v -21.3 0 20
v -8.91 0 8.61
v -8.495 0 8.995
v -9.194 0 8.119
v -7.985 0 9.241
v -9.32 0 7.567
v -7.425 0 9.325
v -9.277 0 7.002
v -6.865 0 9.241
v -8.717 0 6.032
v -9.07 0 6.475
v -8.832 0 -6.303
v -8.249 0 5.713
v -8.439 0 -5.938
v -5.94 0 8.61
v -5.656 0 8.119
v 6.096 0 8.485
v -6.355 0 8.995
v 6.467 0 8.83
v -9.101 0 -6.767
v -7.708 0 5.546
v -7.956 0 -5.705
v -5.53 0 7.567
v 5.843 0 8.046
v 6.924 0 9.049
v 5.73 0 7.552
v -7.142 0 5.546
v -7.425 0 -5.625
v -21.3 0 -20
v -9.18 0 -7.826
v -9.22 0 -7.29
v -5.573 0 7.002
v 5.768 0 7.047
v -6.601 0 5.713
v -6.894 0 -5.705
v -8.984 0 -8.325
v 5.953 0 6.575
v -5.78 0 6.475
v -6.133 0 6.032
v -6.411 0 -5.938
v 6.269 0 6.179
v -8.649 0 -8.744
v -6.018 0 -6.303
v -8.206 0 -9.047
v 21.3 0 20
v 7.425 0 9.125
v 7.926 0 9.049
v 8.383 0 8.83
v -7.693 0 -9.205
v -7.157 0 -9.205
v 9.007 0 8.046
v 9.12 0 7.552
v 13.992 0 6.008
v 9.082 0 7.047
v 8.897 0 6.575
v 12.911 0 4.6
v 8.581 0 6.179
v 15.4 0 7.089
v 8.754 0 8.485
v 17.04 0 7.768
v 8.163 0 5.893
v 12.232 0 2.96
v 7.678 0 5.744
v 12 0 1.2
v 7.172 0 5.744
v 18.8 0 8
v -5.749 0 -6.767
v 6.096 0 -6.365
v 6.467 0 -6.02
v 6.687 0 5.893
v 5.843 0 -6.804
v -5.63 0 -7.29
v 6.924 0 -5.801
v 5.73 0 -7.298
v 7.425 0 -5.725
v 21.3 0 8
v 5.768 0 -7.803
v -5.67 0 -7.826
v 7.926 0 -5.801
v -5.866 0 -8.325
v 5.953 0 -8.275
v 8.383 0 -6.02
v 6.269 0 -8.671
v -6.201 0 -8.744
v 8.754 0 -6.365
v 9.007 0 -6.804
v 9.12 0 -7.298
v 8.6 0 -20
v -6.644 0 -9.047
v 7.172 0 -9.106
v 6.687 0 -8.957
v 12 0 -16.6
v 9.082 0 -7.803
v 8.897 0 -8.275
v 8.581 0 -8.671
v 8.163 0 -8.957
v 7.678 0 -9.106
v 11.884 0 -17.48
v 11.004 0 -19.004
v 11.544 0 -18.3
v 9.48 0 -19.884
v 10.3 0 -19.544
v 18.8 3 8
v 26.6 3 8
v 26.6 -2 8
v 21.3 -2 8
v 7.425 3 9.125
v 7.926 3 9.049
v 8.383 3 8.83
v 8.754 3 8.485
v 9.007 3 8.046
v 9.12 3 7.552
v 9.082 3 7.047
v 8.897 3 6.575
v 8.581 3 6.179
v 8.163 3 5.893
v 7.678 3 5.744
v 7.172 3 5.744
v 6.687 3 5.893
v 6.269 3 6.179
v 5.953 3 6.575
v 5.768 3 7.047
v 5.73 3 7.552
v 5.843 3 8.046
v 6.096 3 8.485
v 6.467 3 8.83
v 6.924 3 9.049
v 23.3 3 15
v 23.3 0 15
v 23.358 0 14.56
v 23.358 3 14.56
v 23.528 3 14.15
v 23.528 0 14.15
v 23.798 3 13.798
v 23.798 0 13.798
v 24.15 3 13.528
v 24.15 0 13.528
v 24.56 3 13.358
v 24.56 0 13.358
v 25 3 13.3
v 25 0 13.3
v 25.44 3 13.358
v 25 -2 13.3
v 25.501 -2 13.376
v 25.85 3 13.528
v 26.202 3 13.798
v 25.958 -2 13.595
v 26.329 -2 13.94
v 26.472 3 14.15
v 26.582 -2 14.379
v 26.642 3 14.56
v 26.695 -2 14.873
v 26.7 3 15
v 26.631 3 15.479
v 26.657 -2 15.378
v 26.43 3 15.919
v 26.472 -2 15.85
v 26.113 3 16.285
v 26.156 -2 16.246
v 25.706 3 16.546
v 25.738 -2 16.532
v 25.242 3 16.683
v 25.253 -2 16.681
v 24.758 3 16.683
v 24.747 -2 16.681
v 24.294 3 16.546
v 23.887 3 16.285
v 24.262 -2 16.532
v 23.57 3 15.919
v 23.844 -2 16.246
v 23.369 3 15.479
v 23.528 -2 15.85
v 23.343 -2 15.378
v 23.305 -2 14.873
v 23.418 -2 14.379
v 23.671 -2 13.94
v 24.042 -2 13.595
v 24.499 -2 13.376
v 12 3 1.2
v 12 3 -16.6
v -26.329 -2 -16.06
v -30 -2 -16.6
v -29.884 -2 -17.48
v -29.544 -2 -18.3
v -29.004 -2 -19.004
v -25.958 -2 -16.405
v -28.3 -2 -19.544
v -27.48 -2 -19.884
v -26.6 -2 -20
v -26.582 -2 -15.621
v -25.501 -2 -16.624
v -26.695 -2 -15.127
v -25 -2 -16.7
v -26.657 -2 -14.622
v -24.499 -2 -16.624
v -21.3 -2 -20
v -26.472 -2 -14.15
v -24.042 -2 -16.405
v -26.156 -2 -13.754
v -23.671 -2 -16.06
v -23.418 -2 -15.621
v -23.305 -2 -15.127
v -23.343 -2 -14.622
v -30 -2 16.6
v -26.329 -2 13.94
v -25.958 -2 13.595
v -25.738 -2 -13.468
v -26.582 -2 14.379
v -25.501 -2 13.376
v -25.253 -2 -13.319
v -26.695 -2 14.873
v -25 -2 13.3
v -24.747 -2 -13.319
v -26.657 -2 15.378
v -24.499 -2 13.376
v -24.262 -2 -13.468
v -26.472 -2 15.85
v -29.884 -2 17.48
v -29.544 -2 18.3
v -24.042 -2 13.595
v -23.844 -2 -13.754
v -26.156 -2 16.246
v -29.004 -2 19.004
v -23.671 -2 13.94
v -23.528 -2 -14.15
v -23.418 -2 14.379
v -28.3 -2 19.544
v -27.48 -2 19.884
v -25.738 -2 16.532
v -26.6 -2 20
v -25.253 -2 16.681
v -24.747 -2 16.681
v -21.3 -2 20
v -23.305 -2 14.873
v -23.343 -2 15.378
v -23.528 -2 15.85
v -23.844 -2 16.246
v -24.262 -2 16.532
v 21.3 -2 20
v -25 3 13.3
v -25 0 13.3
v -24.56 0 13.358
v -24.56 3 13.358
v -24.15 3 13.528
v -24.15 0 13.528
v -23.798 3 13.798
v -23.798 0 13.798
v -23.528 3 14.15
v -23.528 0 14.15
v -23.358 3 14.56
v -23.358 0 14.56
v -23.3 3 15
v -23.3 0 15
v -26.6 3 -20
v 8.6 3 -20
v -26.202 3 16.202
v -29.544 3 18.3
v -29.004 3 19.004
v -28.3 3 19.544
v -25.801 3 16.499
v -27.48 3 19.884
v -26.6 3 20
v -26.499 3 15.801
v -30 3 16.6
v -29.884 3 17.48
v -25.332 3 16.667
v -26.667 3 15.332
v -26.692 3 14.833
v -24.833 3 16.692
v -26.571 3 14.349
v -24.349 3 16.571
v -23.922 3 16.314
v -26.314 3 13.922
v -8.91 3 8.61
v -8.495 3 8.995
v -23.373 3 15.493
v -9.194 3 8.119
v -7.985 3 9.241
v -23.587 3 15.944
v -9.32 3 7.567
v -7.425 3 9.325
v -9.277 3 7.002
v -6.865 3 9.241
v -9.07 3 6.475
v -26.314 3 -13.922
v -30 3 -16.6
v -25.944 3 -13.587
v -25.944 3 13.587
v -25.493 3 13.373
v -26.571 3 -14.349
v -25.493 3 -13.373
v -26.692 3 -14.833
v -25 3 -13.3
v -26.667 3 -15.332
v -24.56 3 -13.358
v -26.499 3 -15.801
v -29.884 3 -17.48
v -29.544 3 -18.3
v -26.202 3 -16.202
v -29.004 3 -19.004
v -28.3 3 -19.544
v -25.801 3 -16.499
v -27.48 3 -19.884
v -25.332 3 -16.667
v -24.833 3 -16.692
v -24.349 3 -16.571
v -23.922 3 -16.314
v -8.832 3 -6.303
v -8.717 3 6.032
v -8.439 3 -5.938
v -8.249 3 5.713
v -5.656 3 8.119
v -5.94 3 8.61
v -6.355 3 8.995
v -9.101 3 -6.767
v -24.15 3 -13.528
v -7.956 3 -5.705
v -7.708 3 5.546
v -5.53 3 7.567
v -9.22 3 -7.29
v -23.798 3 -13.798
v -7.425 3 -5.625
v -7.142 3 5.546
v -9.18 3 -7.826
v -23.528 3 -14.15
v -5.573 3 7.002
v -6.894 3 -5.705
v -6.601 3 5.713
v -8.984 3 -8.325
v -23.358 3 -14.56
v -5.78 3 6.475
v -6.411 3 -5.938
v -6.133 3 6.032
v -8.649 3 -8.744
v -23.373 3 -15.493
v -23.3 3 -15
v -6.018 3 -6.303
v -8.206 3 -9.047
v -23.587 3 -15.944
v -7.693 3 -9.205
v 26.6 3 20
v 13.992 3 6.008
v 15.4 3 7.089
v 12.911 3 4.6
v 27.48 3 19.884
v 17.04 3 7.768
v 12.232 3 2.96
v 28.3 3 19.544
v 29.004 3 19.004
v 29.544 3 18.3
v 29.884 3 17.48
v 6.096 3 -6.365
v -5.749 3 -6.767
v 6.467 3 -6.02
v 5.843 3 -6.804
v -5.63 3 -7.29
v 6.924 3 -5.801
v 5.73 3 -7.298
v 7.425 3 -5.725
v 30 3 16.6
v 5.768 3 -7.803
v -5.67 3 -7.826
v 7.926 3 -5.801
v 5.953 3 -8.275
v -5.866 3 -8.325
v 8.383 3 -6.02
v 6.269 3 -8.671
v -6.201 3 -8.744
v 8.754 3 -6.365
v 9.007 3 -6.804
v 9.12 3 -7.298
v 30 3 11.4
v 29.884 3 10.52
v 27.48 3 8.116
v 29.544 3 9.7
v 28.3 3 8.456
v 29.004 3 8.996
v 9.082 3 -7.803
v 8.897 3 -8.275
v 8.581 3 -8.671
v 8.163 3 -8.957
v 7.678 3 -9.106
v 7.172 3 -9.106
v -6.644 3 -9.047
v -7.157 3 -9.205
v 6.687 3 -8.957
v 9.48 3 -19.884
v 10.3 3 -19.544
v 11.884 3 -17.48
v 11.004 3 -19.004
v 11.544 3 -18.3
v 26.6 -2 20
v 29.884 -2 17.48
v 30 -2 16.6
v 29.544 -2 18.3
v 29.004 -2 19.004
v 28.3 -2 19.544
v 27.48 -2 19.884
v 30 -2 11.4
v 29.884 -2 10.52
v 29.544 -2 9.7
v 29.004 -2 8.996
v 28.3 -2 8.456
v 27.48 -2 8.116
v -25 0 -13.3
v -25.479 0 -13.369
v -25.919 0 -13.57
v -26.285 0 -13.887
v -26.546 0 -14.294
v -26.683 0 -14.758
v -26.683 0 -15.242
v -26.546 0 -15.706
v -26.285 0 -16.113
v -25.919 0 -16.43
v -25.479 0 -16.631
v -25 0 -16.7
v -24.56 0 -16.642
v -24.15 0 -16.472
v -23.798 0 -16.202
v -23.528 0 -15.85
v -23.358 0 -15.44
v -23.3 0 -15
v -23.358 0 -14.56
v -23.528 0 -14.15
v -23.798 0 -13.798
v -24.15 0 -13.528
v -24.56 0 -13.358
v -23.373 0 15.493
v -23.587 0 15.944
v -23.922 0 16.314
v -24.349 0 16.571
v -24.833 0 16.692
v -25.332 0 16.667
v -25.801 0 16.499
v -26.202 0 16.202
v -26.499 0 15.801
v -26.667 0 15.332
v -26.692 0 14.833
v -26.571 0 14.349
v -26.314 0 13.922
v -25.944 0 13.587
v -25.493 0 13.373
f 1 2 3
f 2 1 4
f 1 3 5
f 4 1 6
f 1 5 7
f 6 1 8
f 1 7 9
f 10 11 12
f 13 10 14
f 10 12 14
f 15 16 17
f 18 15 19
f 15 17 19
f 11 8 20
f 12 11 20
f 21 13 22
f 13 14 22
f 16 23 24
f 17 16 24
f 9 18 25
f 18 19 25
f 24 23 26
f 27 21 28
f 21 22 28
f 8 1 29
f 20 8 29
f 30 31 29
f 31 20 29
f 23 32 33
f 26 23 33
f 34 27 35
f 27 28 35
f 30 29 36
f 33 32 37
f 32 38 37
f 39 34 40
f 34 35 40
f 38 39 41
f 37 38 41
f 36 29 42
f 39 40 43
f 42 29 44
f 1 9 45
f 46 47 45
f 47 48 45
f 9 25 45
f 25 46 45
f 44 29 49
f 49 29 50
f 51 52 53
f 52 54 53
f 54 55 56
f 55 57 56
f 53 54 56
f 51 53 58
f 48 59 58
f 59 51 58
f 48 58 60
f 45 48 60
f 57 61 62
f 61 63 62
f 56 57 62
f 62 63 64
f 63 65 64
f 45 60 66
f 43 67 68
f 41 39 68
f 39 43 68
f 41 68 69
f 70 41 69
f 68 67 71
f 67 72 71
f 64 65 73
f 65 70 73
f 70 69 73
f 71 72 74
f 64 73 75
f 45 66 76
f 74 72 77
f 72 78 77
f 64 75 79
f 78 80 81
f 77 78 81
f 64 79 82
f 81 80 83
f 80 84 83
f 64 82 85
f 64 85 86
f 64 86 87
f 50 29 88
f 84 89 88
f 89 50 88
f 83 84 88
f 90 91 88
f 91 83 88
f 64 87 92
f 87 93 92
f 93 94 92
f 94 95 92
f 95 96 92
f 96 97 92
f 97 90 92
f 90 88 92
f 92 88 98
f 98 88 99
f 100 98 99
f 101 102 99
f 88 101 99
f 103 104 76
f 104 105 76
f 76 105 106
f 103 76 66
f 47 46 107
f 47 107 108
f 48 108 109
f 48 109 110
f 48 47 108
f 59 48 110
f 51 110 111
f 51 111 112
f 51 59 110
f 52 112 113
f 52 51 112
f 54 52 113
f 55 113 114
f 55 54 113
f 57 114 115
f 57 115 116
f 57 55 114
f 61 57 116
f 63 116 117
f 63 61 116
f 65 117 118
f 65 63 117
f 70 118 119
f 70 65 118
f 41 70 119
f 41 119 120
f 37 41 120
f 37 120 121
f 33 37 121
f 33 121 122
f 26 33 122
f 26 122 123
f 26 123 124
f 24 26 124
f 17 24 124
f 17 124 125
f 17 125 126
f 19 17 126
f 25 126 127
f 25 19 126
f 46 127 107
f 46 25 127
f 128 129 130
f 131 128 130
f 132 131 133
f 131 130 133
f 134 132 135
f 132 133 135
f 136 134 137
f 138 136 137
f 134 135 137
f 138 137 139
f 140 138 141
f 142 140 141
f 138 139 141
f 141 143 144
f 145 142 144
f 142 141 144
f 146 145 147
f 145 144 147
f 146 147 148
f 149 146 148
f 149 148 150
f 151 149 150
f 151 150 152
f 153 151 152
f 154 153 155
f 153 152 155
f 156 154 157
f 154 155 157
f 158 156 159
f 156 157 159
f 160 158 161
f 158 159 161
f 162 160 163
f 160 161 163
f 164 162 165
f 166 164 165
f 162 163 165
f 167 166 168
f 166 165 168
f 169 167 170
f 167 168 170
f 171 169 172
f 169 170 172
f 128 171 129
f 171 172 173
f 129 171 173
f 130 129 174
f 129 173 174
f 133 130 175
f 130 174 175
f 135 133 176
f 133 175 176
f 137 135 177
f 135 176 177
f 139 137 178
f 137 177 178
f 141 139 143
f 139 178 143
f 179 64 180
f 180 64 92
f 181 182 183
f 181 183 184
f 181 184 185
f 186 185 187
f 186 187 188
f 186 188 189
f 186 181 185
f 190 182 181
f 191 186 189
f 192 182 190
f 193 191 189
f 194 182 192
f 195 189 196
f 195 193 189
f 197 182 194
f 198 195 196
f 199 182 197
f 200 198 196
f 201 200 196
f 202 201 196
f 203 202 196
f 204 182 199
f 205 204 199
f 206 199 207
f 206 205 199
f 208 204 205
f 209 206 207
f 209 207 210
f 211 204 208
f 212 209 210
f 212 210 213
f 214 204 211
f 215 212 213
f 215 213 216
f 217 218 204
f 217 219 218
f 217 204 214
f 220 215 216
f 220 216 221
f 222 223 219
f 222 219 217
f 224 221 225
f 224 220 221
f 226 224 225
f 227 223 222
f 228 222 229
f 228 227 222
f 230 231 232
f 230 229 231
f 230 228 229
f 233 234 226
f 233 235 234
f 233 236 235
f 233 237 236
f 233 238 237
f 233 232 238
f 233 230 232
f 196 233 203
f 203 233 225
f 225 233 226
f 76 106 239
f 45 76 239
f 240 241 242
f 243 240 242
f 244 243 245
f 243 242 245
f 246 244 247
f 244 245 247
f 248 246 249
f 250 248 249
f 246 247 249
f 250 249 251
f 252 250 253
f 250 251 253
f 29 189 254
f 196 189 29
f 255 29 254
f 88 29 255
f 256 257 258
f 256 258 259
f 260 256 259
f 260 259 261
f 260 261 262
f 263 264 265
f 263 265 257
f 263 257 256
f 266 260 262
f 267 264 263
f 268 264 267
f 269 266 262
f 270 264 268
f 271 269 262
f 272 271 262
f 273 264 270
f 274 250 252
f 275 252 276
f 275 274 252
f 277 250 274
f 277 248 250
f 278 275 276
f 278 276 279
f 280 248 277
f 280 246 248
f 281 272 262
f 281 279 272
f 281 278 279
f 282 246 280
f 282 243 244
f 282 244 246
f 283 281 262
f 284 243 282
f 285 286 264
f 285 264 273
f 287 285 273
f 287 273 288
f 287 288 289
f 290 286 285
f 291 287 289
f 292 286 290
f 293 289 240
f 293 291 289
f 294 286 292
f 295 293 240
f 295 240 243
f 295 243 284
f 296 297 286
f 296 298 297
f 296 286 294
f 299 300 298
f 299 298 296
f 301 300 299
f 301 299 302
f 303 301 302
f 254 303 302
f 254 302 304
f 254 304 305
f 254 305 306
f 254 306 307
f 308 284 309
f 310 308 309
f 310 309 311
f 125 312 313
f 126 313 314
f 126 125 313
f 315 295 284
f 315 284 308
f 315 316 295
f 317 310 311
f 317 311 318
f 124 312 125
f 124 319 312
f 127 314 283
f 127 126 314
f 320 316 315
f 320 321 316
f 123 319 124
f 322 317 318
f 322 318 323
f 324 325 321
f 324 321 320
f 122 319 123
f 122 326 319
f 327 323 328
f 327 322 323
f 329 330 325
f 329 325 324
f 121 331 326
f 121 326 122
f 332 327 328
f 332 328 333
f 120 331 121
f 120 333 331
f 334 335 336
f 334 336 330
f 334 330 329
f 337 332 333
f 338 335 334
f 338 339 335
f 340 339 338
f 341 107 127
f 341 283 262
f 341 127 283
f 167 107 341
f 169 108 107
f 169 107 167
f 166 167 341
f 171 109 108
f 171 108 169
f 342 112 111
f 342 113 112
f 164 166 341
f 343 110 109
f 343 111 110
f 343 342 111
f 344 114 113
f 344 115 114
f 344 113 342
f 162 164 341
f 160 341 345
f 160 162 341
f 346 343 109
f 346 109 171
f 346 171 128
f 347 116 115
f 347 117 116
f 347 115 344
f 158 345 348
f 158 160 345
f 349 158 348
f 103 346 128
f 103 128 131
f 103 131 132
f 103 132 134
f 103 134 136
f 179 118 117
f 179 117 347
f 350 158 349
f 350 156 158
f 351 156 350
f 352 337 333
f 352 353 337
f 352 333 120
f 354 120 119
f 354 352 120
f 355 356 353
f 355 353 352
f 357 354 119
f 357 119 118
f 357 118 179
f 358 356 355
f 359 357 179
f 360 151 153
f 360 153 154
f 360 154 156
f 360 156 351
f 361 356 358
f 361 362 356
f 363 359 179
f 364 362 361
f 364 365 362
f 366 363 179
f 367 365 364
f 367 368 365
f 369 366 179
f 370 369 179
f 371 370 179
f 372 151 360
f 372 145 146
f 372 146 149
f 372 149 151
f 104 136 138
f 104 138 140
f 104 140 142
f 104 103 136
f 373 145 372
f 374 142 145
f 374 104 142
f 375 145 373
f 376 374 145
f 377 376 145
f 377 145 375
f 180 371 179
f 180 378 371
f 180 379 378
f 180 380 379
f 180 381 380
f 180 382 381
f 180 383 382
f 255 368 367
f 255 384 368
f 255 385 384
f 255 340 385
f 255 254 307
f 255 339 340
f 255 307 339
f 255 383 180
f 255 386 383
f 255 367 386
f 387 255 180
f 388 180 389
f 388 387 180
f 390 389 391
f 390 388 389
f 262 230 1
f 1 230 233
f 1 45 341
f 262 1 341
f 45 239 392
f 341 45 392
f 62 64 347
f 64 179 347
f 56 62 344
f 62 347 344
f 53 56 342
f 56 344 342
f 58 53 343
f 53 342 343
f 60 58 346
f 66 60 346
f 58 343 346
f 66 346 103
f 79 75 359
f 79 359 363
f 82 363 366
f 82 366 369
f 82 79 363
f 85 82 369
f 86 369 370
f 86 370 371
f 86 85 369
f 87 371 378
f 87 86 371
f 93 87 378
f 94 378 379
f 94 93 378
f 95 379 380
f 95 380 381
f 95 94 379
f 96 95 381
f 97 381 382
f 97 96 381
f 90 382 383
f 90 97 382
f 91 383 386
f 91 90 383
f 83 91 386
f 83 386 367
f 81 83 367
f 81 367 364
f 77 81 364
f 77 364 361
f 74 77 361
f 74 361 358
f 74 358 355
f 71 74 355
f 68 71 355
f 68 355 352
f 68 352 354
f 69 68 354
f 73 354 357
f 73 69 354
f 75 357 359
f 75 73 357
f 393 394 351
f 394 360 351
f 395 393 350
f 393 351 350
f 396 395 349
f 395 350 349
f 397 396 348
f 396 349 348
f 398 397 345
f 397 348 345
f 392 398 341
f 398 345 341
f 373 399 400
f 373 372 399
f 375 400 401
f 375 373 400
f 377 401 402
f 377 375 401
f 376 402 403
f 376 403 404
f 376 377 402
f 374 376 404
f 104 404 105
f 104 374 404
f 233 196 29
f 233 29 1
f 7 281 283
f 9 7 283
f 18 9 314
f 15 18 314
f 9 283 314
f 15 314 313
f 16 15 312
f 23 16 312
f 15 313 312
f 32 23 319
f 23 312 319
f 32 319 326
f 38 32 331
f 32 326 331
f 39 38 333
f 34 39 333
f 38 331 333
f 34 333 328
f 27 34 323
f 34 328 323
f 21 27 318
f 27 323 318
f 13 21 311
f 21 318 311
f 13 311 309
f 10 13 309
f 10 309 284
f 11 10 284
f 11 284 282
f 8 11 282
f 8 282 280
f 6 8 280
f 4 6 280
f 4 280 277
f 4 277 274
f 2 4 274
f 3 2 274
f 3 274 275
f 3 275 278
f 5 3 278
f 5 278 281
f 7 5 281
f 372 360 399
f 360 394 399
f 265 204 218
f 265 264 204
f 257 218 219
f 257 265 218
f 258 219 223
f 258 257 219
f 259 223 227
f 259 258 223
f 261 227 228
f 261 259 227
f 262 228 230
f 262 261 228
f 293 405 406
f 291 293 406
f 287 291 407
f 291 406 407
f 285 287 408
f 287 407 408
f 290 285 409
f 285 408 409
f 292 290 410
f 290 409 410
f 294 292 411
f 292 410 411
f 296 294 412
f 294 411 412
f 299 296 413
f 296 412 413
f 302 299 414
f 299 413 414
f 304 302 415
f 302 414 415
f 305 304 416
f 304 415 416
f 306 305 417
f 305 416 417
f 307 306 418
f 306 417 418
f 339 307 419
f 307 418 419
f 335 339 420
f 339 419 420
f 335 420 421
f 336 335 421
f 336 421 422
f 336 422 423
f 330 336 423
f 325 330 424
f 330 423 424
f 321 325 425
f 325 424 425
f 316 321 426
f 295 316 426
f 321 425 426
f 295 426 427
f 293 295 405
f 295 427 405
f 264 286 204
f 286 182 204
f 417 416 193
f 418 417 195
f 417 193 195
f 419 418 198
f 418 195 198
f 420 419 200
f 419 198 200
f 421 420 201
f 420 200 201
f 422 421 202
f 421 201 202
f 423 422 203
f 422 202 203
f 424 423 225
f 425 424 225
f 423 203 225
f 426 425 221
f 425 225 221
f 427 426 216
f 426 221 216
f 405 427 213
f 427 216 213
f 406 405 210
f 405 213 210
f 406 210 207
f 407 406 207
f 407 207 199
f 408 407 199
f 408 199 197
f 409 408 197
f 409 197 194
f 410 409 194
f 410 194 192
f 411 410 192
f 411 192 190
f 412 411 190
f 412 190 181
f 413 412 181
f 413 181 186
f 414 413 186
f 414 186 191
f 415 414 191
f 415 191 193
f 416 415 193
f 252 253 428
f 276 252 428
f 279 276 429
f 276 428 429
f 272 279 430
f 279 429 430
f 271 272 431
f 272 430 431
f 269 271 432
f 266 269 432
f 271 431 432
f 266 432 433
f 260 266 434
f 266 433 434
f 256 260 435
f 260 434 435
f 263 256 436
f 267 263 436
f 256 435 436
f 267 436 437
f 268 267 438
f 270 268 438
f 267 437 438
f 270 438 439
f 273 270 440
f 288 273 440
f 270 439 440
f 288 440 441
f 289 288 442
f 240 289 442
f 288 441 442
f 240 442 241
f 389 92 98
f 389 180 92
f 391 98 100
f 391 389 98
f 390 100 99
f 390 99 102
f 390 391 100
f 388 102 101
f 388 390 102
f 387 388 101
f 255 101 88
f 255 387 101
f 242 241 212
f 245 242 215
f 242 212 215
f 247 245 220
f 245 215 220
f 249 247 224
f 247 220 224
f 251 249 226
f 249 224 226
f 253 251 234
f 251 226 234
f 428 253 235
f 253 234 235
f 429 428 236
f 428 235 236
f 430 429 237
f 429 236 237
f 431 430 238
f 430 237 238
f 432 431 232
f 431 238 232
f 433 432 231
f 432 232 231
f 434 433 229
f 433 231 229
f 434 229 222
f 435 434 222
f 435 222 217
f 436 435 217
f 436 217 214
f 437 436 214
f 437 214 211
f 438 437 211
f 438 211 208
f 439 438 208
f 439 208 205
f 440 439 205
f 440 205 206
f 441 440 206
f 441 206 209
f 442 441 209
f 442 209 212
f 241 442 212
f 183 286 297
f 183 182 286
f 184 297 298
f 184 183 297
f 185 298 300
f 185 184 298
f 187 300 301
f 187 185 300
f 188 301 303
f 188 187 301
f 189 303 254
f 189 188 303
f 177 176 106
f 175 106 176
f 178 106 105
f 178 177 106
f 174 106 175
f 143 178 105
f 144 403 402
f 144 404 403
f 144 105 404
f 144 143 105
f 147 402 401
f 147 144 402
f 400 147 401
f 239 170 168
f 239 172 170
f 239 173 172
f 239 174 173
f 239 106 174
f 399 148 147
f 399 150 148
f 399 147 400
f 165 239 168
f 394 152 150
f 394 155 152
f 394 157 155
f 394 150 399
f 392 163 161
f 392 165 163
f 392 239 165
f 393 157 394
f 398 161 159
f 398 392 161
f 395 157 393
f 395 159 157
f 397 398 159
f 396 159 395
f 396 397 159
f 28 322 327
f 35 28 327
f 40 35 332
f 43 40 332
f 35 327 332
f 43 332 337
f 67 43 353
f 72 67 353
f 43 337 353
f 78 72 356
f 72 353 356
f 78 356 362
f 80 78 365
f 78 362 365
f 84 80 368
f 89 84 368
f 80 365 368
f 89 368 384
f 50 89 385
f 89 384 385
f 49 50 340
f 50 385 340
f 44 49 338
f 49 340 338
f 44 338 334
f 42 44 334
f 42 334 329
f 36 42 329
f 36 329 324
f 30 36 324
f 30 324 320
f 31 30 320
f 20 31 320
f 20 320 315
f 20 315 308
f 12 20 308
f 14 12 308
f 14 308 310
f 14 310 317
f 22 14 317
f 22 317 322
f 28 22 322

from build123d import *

# Parameters (mm, degrees)
SKETCH_2_W          = 24
SKETCH_2_H          = 5
SKETCH_2_R          = 1.7
EXTRUDE_1_DEPTH     = 3
FILLET_2_R          = 6.8
EXTRUDE_START       = 2
SKETCH_4_W          = 8.7
SKETCH_4_H          = 40
SKETCH_4_R          = 1.7
SKETCH_4_H_2        = 12
EXTRUDE_2_DEPTH     = 2
FILLET_3_R          = 3.4
SKETCH_5_R          = 1.9
SKETCH_5_R_2        = 1.8
CUT_EXTRUDE_1_DEPTH = 10


with BuildPart() as part:
    # 草图2 → 凸台-拉伸1 (new body)
    # profile 1 of 7: a face of its own
    with BuildSketch(Plane(origin=(0, 0, 0), x_dir=(1, 0, 0), z_dir=(0, 1, 0))):
        with BuildLine():
            Line((25, -8), (12, -8))
            Line((12, -8), (12, -15))
            Line((12, -15), (23.3, -15))
            ThreePointArc((23.3, -15), (23.797918472, -13.797918472), (25, -13.3))
            Line((25, -13.3), (25, -8))
        make_face()
    # profile 2 of 7: a face of its own
    with BuildSketch(Plane(origin=(0, 0, 0), x_dir=(1, 0, 0), z_dir=(0, 1, 0))):
        with BuildLine():
            Line((23.3, -15), (12, -15))
            Line((12, -15), (12, -20))
            Line((12, -20), (30, -20))
            Line((30, -20), (30, -8))
            Line((30, -8), (25, -8))
            Line((25, -8), (25, -13.3))
            ThreePointArc((25, -13.3), (26.202081528, -13.797918472), (26.7, -15))
            ThreePointArc((26.7, -15), (25, -16.7), (23.3, -15))
        make_face()
    # profile 3 of 7: a face of its own
    with BuildSketch(Plane(origin=(0, 0, 0), x_dir=(1, 0, 0), z_dir=(0, 1, 0))):
        with Locations((0, -17.5)):
            Rectangle(SKETCH_2_W, SKETCH_2_H)
    # profile 4 of 7: a face of its own
    with BuildSketch(Plane(origin=(0, 0, 0), x_dir=(1, 0, 0), z_dir=(0, 1, 0))):
        Polygon((12, 15), (-12, 15), (-12, -15), (12, -15), (12, -8), align=None)
        with Locations(Location((-7.425, -7.425, 0), (0, 0, 270))):
            Circle(SKETCH_2_R, mode=Mode.SUBTRACT)
        with Locations(Location((7.425, -7.425, 0), (0, 0, 270))):
            Circle(SKETCH_2_R, mode=Mode.SUBTRACT)
        with Locations(Location((-7.425, 7.425, 0), (0, 0, 270))):
            Circle(SKETCH_2_R, mode=Mode.SUBTRACT)
        with Locations(Location((7.425, 7.425, 0), (0, 0, 270))):
            Circle(SKETCH_2_R, mode=Mode.SUBTRACT)
    # profile 5 of 7: a face of its own
    with BuildSketch(Plane(origin=(0, 0, 0), x_dir=(1, 0, 0), z_dir=(0, 1, 0))):
        with Locations((0, 17.5)):
            Rectangle(SKETCH_2_W, SKETCH_2_H)
    # profile 6 of 7: a face of its own
    with BuildSketch(Plane(origin=(0, 0, 0), x_dir=(1, 0, 0), z_dir=(0, 1, 0))):
        with BuildLine():
            Line((-12, 15), (-23.3, 15))
            ThreePointArc((-23.3, 15), (-23.797918472, 13.797918472), (-25, 13.3))
            Line((-25, 13.3), (-25, -13.3))
            ThreePointArc((-25, -13.3), (-23.797918472, -13.797918472), (-23.3, -15))
            Line((-23.3, -15), (-12, -15))
            Line((-12, -15), (-12, 15))
        make_face()
    # profile 7 of 7: a face of its own
    with BuildSketch(Plane(origin=(0, 0, 0), x_dir=(1, 0, 0), z_dir=(0, 1, 0))):
        with BuildLine():
            ThreePointArc((-25, 13.3), (-26.202081528, 16.202081528), (-23.3, 15))
            Line((-23.3, 15), (-12, 15))
            Line((-12, 15), (-12, 20))
            Line((-12, 20), (-30, 20))
            Line((-30, 20), (-30, -20))
            Line((-30, -20), (-12, -20))
            Line((-12, -20), (-12, -15))
            Line((-12, -15), (-23.3, -15))
            ThreePointArc((-23.3, -15), (-26.202081528, -16.202081528), (-25, -13.3))
            Line((-25, -13.3), (-25, 13.3))
        make_face()
    extrude(amount=EXTRUDE_1_DEPTH)

    # 圆角2
    fillet_2_edges = [part.edges().sort_by_distance(p)[0] for p in [
        (12, 1.5, 8),
    ]]
    fillet(fillet_2_edges, radius=FILLET_2_R)

    # 草图4 → 凸台-拉伸2 (add)
    # profile 1 of 2: a face of its own
    with BuildSketch(Plane.XZ.offset(EXTRUDE_START)):
        with Locations((-25.65, 0)):
            Rectangle(SKETCH_4_W, SKETCH_4_H)
        with Locations(Location((-25, 15, 0), (0, 0, 270))):
            Circle(SKETCH_4_R, mode=Mode.SUBTRACT)
        with Locations(Location((-25, -15, 0), (0, 0, 270))):
            Circle(SKETCH_4_R, mode=Mode.SUBTRACT)
    # profile 2 of 2: a face of its own
    with BuildSketch(Plane.XZ.offset(EXTRUDE_START)):
        with Locations((25.65, 14)):
            Rectangle(SKETCH_4_W, SKETCH_4_H_2)
        with Locations(Location((25, 15, 0), (0, 0, 270))):
            Circle(SKETCH_4_R, mode=Mode.SUBTRACT)
    extrude(amount=-EXTRUDE_2_DEPTH)

    # 圆角3
    fillet_3_edges = [part.edges().sort_by_distance(p)[0] for p in [
        (12, 1.5, -20),
        (30, 0.5, 8),
        (30, 0.5, 20),
        (-30, 0.5, 20),
        (-30, 0.5, -20),
    ]]
    fillet(fillet_3_edges, radius=FILLET_3_R)

    # 草图5 → 切除-拉伸1 (cut)
    with BuildSketch(Plane(origin=(0, 3, 0), x_dir=(1, 0, 0), z_dir=(0, 1, 0))):
        with Locations(Location((-7.425, -7.425, 0), (0, 0, 270))):
            Circle(SKETCH_5_R)
        with Locations(Location((-7.425, 7.425, 0), (0, 0, 270))):
            Circle(SKETCH_5_R_2)
    extrude(amount=-CUT_EXTRUDE_1_DEPTH, mode=Mode.SUBTRACT)


solid = part.part
